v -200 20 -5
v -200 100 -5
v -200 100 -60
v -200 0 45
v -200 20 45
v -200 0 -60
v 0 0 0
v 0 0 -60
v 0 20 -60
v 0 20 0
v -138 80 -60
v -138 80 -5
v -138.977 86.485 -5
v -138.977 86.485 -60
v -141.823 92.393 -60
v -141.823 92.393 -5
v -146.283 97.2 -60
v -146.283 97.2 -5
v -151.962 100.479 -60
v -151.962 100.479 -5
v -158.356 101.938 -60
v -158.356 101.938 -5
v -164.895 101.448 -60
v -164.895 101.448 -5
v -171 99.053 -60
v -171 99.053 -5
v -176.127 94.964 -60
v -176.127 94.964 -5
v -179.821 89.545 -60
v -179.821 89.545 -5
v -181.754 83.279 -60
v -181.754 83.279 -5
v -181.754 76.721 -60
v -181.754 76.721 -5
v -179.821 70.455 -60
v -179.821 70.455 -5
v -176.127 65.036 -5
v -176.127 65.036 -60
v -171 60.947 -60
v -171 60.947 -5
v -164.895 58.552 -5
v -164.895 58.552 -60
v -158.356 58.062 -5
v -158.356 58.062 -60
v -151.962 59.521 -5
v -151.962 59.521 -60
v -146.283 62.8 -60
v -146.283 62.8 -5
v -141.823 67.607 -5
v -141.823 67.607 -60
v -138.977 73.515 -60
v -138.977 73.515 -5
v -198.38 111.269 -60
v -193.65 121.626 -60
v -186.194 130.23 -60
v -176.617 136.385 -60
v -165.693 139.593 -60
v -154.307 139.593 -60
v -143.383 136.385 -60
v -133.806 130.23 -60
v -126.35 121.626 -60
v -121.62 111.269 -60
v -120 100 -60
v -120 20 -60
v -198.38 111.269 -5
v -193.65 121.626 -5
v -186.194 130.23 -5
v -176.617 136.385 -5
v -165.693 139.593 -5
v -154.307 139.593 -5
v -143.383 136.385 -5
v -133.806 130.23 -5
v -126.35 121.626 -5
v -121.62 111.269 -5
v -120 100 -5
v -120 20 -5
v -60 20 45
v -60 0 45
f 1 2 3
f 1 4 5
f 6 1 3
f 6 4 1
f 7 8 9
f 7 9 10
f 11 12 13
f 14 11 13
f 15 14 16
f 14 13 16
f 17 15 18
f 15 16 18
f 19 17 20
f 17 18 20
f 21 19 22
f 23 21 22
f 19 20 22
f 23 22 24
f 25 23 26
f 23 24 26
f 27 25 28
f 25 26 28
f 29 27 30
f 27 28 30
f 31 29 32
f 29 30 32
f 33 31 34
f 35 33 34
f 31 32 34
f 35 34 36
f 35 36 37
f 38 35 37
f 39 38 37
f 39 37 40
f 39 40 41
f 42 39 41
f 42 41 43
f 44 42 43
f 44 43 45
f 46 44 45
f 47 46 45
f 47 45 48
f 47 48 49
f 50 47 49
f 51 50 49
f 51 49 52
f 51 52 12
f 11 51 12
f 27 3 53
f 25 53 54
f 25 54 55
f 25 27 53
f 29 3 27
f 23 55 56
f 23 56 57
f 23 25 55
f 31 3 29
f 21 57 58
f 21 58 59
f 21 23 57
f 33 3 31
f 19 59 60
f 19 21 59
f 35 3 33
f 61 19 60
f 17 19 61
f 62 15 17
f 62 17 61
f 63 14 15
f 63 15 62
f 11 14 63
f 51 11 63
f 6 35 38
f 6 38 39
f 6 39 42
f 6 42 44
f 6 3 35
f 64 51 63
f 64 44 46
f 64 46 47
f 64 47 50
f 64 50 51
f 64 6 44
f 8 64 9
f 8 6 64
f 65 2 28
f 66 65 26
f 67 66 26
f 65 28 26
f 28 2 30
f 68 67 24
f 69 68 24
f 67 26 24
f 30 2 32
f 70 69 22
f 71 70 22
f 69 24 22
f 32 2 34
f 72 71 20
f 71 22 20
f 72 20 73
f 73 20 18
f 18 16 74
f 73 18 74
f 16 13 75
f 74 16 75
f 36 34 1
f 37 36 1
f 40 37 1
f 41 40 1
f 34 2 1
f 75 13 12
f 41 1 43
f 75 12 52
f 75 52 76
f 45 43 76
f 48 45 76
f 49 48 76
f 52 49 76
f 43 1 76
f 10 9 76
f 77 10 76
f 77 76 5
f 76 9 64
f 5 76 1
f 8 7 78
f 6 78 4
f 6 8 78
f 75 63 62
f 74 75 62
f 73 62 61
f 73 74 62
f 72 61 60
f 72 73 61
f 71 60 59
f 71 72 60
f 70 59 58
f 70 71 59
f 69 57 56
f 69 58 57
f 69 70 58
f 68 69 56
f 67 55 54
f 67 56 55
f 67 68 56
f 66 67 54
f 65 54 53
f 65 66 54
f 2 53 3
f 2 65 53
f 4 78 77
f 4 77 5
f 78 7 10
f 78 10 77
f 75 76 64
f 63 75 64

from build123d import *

# Parameters (mm, degrees)
BOSS_EXTRUDE1_DEPTH = 20
SKETCH4_W           = 80
SKETCH4_H           = 55
BOSS_EXTRUDE3_DEPTH = 120
FILLET2_RADIUS      = 40
FILLET2_LENGTH      = 55
SKETCH5_R           = 22
CUT_EXTRUDE1_DEPTH  = 120


with BuildPart() as part:
    # Sketch1 → Boss-Extrude1 (new body)
    with BuildSketch(Plane(origin=(0, 0, 0), x_dir=(1, 0, 0), z_dir=(0, 1, 0))):
        Polygon((-200, 60), (0, 60), (0, 0), (-60, -45), (-200, -45), align=None)
    extrude(amount=BOSS_EXTRUDE1_DEPTH)

    # Sketch4 → Boss-Extrude3 (add)
    with BuildSketch(Plane(origin=(0, 20, 0), x_dir=(1, 0, 0), z_dir=(0, 1, 0))):
        with Locations((-160, 32.5)):
            Rectangle(SKETCH4_W, SKETCH4_H)
    extrude(amount=BOSS_EXTRUDE3_DEPTH)

    # Fillet2: full round fillet: the end face becomes a half cylinder, R = half its width
    fillet2_face = Plane((-160, 140, -32.5), x_dir=(0, 0, 1), z_dir=(0, 1, 0))  # on the end face: x along it, z out of the body
    fillet2_slab = fillet2_face.offset(-FILLET2_RADIUS / 2) * Box(FILLET2_LENGTH, 2 * FILLET2_RADIUS, FILLET2_RADIUS, mode=Mode.PRIVATE)  # the body's end, R deep
    fillet2_round = Plane((-160, 100, -32.5), x_dir=(0, 1, 0), z_dir=(0, 0, 1)) * Cylinder(FILLET2_RADIUS, FILLET2_LENGTH, mode=Mode.PRIVATE)  # its axis R under the face
    add(fillet2_slab - fillet2_round, mode=Mode.SUBTRACT)

    # Sketch5 → Cut-Extrude1 (cut)
    with BuildSketch(Plane.XY.offset(-5)):
        with Locations((-160, 80)):
            Circle(SKETCH5_R)
    extrude(amount=-CUT_EXTRUDE1_DEPTH, mode=Mode.SUBTRACT)


solid = part.part
